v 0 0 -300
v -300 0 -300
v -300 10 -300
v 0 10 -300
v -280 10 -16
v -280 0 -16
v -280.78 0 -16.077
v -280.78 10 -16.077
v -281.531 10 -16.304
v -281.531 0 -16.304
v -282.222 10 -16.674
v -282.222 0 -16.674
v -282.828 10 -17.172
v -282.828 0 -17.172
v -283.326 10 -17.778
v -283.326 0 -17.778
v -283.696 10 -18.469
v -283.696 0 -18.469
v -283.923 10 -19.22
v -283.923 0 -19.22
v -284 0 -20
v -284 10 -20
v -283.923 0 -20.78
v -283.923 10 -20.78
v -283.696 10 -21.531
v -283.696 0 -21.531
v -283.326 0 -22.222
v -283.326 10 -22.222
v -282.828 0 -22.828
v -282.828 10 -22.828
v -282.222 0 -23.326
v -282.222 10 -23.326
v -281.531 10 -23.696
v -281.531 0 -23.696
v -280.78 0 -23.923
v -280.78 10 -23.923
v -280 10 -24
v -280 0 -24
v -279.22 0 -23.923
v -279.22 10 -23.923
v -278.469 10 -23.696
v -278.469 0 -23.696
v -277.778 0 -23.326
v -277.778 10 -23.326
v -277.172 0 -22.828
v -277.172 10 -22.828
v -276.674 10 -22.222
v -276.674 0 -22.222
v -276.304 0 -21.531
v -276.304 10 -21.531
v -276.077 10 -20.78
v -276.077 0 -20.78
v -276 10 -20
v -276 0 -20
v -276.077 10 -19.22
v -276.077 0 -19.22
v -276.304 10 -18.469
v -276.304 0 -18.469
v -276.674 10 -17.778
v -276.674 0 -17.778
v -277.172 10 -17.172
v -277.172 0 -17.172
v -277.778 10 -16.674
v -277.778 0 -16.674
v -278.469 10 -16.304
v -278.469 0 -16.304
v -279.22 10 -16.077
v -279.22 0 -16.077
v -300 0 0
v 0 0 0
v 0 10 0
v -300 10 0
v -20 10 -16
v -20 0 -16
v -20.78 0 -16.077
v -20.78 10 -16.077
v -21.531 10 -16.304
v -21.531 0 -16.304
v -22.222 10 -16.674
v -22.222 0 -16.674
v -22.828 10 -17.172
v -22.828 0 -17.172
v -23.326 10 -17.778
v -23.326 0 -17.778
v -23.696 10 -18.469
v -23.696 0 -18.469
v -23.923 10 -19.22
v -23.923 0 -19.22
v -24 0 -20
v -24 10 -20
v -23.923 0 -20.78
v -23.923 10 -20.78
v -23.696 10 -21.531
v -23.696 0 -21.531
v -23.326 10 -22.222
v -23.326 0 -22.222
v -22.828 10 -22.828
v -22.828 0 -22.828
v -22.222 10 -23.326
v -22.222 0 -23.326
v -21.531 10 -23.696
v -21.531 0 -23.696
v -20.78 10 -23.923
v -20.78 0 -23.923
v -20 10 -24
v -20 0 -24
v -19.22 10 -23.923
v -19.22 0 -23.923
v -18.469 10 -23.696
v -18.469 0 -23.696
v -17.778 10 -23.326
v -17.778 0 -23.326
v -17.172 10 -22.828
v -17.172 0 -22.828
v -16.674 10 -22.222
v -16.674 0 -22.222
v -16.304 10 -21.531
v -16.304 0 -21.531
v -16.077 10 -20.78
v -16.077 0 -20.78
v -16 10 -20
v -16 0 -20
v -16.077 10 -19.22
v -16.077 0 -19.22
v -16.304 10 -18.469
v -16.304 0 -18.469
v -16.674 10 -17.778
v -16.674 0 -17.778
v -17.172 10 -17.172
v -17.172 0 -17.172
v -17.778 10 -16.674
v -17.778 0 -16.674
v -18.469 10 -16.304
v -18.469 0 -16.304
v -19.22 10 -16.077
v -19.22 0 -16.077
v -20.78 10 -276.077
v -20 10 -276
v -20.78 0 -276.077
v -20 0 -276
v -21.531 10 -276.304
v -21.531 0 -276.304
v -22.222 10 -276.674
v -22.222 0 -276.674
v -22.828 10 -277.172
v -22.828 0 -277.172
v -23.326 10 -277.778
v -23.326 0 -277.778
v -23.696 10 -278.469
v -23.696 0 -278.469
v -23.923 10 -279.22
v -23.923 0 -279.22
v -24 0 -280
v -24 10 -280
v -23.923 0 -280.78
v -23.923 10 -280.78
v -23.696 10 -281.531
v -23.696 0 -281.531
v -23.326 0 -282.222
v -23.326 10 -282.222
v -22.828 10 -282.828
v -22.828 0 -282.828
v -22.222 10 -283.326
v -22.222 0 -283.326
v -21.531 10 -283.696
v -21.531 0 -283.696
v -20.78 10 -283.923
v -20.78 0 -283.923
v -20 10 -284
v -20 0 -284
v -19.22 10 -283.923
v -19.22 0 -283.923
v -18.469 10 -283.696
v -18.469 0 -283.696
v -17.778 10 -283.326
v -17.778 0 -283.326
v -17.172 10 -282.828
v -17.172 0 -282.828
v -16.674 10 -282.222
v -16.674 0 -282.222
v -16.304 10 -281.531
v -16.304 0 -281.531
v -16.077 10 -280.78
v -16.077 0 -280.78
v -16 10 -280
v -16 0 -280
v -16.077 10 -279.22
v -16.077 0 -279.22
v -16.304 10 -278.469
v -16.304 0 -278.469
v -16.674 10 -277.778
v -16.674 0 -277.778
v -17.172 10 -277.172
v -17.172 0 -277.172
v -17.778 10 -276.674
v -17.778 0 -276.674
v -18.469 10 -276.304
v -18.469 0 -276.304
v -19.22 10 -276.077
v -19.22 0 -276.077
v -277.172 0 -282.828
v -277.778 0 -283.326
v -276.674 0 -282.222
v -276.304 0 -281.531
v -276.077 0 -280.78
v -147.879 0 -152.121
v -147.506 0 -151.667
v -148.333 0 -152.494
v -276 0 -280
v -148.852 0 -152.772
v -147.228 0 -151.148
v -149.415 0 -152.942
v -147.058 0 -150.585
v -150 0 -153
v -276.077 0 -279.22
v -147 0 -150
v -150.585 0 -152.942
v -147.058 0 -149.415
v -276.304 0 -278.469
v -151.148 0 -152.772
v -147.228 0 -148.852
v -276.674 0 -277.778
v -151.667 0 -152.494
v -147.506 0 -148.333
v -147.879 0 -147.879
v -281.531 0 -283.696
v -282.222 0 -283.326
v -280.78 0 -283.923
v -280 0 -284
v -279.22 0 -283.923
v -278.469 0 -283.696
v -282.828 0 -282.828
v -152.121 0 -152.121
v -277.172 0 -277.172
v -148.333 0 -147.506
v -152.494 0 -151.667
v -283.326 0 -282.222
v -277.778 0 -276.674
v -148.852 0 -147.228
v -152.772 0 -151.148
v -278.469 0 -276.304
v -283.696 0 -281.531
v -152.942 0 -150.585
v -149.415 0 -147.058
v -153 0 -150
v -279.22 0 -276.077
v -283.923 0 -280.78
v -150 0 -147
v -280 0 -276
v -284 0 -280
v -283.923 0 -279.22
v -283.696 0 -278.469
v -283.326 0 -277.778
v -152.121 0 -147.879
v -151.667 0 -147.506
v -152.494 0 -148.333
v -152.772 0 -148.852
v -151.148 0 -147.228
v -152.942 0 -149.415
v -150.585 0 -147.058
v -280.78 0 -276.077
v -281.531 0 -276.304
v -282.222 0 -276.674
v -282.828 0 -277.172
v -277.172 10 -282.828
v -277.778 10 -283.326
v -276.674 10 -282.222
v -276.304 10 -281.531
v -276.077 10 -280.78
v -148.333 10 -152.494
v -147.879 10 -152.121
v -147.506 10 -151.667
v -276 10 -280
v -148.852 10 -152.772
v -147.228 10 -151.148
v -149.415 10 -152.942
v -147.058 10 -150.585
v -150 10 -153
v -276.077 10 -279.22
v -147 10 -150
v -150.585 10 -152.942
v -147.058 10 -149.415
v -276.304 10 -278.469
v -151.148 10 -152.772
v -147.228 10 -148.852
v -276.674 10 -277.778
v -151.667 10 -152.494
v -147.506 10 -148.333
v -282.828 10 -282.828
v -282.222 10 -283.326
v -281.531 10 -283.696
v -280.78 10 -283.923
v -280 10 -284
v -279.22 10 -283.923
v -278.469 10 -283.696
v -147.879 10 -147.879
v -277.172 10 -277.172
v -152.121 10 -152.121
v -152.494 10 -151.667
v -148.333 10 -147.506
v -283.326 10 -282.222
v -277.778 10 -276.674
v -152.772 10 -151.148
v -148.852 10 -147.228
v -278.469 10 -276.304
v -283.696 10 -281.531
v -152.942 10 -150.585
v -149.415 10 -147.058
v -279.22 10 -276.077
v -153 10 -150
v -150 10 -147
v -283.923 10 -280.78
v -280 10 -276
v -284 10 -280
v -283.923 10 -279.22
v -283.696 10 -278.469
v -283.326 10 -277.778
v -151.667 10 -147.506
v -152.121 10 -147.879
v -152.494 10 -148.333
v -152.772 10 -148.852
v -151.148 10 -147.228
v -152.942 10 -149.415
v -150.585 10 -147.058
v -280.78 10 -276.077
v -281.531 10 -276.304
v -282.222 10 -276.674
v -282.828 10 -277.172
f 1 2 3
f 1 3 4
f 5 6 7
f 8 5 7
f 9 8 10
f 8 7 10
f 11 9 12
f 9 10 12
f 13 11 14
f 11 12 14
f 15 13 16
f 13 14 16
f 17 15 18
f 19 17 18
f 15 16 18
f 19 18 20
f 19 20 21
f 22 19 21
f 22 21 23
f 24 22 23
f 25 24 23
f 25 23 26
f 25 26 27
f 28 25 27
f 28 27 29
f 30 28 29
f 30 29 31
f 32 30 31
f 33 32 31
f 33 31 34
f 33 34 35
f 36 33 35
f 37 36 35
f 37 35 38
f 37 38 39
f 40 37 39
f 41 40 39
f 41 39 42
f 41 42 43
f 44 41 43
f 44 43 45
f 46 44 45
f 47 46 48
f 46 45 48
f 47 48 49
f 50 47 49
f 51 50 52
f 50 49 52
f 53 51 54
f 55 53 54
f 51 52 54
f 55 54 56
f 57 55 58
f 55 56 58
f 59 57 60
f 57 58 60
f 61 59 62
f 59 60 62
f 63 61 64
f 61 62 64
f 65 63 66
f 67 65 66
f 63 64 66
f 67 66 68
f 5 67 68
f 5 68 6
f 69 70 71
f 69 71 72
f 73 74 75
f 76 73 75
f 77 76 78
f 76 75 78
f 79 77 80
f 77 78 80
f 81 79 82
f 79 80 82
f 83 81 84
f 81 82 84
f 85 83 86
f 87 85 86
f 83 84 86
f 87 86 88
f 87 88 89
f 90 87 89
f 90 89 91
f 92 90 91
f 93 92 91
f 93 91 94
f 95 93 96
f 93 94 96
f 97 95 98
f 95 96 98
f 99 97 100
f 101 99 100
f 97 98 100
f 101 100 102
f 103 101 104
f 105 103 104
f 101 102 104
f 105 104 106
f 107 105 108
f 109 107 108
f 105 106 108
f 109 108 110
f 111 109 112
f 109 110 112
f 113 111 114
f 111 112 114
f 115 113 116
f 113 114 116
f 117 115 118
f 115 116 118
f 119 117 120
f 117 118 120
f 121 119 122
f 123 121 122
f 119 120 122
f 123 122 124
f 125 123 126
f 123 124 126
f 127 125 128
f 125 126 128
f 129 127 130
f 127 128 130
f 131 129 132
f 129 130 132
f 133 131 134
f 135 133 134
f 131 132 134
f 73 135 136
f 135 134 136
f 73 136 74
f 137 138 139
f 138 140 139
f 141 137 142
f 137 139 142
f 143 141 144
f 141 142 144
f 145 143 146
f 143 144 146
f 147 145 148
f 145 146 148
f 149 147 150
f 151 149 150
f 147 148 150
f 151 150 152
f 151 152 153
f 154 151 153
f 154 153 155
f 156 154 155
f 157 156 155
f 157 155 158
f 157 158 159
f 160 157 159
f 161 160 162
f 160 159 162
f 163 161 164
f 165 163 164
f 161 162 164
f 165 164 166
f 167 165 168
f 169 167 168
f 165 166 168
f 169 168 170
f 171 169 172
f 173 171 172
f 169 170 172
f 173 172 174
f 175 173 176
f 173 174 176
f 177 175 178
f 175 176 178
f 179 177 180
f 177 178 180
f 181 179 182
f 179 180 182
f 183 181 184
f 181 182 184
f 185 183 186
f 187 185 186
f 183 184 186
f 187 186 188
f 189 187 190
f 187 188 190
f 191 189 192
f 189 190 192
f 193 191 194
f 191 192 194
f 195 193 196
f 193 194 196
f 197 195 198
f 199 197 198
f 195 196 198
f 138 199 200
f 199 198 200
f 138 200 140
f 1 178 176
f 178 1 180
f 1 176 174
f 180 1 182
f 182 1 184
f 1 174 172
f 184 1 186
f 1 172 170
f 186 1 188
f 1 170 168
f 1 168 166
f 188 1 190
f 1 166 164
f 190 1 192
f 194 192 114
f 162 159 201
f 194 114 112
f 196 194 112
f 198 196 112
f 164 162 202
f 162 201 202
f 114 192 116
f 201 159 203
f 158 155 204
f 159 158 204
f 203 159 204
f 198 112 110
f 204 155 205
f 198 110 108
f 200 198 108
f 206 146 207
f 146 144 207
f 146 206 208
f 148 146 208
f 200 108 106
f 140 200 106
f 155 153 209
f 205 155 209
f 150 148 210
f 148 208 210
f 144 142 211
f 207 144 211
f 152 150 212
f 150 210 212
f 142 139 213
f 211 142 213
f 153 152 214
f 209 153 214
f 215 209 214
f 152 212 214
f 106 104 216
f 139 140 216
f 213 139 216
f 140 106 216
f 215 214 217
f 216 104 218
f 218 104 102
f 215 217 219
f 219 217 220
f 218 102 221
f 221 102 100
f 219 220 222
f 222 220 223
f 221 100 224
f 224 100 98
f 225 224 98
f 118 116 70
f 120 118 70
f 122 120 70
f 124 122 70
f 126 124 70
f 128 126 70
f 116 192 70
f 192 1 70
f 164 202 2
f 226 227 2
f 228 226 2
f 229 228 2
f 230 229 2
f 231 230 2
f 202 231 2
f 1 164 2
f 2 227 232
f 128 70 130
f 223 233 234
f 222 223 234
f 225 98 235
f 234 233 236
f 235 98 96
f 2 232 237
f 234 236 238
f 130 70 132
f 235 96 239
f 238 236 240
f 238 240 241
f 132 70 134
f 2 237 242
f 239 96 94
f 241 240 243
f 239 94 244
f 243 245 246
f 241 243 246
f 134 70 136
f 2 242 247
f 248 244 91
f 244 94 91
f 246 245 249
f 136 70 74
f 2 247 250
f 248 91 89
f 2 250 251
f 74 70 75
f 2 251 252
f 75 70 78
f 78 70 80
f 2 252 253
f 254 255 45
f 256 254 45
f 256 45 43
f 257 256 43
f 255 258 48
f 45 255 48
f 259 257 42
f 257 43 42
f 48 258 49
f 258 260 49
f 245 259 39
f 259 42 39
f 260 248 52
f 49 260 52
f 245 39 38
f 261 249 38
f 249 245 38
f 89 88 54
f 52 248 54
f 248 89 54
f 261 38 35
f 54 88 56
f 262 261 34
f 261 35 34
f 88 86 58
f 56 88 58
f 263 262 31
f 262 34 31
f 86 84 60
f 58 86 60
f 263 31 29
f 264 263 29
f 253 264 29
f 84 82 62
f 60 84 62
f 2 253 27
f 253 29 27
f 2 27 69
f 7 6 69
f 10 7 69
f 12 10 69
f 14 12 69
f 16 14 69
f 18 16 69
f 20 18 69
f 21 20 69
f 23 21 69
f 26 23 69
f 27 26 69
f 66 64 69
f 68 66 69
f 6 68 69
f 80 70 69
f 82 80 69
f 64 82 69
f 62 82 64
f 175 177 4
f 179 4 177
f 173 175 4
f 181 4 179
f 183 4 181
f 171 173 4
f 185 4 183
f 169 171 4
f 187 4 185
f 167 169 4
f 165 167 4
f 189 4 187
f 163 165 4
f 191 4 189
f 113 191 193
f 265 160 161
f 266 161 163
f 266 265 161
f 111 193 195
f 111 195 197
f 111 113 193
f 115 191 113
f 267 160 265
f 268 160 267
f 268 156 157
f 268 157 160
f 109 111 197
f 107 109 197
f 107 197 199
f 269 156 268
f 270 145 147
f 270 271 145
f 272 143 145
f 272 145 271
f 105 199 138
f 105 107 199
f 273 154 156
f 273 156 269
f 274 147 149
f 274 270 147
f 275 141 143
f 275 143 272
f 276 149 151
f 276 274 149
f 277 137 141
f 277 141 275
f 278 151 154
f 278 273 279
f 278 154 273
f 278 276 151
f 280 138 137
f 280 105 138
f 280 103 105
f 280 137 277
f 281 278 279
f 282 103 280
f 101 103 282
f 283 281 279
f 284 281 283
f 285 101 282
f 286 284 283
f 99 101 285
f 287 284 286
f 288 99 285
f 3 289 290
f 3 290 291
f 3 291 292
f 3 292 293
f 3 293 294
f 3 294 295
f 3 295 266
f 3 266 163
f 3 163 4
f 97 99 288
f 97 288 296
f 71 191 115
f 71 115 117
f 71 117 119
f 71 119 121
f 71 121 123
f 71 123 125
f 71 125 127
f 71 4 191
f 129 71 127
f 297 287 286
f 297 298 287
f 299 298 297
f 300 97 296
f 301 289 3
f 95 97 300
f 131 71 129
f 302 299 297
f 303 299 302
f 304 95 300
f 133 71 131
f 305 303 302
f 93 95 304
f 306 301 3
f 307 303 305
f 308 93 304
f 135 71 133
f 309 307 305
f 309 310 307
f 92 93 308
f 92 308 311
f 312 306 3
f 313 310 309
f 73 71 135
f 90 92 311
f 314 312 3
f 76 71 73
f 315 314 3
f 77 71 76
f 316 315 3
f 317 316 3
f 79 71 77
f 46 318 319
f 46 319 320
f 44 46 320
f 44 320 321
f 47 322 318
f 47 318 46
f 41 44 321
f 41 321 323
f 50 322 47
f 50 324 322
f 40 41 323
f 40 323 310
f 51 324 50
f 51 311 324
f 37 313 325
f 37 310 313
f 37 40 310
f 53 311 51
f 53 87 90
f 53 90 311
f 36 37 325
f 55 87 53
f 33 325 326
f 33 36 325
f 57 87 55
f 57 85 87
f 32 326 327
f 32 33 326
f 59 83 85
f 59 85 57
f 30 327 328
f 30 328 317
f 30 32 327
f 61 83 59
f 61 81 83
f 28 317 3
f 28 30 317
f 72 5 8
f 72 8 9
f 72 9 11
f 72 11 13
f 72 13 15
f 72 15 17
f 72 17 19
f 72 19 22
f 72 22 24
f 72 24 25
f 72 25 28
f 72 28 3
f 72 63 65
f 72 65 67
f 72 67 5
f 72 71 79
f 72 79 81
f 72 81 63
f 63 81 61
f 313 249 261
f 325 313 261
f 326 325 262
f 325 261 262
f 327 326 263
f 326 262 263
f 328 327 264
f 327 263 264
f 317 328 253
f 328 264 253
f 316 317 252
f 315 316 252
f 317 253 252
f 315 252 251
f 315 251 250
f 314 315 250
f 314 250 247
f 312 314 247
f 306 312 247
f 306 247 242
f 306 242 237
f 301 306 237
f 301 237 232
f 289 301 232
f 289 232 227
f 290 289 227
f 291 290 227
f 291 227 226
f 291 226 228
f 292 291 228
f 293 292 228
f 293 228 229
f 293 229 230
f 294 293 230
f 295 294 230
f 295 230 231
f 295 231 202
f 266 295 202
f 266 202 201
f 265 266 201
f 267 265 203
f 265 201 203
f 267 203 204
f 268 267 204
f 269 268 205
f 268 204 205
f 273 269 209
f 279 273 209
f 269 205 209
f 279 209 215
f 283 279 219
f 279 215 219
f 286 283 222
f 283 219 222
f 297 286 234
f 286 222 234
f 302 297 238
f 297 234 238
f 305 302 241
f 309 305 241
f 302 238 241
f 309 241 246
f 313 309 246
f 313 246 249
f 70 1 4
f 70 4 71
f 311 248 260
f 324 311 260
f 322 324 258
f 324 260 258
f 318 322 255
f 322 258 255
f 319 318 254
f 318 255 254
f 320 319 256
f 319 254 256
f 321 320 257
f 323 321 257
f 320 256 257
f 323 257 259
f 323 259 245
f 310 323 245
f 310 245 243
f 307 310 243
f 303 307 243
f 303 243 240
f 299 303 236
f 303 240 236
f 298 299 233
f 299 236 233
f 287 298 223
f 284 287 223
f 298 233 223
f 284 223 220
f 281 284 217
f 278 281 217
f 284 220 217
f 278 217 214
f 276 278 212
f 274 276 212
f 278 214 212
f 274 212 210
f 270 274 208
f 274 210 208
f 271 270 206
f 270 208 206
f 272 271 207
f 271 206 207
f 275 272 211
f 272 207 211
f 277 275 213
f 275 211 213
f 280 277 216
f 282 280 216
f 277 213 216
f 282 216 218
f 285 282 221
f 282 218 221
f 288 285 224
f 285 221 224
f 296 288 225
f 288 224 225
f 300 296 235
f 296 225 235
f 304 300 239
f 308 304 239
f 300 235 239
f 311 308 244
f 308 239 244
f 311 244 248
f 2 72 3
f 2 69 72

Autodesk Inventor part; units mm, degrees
ref_plane "YZ Plane" through (0, 0, 0) normal (1, 0, 0) x (0, 1, 0)
ref_plane "XZ Plane" through (0, 0, 0) normal (0, 1, 0) x (-1, 0, 0)
ref_plane "XY Plane" through (0, 0, 0) normal (0, 0, 1) x (1, 0, 0)
sketch "Sketch1" plane through (0, 0, 0) normal (0, 1, 0) x (-1, 0, 0)
  line L0 (0, 0) -> (300, 0)
  line L1 (300, 0) -> (300, -300)
  line L2 (300, -300) -> (0, -300)
  line L3 (0, -300) -> (0, 0)
  dimension "d0" = 300
  dimension "d1" = 300
extrude "Extrusion1" add sketch "Sketch1" along normal blind 10
sketch "Sketch2" plane through (0, 10, 0) normal (0, 1, 0) x (1, 0, 0)
  line L0 (-300, 0) -> (0, 0) projected
  line L1 (0, 0) -> (0, 300) projected
  point P0 (-20, 20)
  point P1 (-20, 280)
  point P2 (-280, 20)
  point P3 (-280, 280)
  dimension "d4" = 20
  dimension "d5" = 20
  dimension "d8" = 260
  dimension "d11" = 260
hole "Hole1" at (-20, 10, -20) at (-20, 10, -280) at (-280, 10, -20) at (-280, 10, -280) direction (0, -1, 0) diameter 8 end through all
sketch "Sketch3" plane through (0, 10, 0) normal (0, 1, 0) x (1, 0, 0)
  line L0 (-300, 300) -> (-300, 0) projected
  line L1 (0, 300) -> (-300, 300) projected
  point P0 (0, 0)
  point P1 (-150, 150)
  dimension "d21" = 150
  dimension "d22" = 150
hole "Hole2" at (-150, 10, -150) direction (0, -1, 0) diameter 6 end through all
properties part number "Plate"
